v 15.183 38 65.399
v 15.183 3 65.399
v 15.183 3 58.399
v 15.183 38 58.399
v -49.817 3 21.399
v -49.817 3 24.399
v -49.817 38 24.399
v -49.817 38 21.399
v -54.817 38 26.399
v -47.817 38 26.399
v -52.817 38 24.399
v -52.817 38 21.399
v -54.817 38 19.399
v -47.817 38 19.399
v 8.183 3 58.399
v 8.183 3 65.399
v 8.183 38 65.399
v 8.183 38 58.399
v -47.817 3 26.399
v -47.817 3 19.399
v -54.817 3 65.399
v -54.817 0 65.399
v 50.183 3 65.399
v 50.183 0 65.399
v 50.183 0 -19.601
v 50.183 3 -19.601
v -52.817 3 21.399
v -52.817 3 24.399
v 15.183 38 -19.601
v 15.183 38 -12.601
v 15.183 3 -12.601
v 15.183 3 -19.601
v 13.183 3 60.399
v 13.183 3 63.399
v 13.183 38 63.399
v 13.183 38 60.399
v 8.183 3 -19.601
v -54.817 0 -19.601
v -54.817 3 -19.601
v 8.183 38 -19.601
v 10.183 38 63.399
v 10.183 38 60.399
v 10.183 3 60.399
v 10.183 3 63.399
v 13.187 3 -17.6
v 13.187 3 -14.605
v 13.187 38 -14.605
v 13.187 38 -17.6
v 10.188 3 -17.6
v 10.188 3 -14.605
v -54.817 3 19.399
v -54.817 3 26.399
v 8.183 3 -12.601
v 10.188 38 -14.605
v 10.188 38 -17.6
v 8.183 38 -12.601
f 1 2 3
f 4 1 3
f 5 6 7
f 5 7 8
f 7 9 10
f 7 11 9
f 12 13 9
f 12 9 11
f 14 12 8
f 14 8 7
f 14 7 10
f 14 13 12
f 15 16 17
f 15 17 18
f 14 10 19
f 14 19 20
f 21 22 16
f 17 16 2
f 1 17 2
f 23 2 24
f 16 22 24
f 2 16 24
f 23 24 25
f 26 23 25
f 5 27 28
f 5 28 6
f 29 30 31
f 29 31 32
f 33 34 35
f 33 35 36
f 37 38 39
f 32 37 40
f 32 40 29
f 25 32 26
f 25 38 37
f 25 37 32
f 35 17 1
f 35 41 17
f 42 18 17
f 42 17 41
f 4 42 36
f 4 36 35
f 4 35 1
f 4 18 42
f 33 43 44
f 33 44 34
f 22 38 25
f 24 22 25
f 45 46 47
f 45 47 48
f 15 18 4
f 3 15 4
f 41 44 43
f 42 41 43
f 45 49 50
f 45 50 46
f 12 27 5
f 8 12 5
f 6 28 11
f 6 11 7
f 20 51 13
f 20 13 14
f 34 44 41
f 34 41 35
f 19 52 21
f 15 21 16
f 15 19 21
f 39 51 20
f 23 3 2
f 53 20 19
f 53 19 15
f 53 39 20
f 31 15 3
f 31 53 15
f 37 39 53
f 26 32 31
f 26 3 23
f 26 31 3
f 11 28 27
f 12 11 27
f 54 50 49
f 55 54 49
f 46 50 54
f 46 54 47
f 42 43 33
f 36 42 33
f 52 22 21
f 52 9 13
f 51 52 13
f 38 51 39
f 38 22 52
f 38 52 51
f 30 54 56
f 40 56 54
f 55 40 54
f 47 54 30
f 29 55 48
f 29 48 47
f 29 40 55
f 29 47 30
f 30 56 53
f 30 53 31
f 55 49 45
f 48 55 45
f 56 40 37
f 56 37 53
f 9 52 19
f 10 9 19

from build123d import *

# Parameters (mm, degrees)
SKETCH3_W           = 105
SKETCH3_H           = 85
BOSS_EXTRUDE3_DEPTH = 3
SKETCH5_W           = 7
SKETCH5_H           = 7
SKETCH5_W_2         = 3
SKETCH5_H_2         = 3
BOSS_EXTRUDE4_DEPTH = 35
SKETCH9_W           = 2.998895248
SKETCH9_H           = 2.995380601
BOSS_EXTRUDE5_DEPTH = 35
SKETCH11_W          = 7
SKETCH11_H          = 7
SKETCH11_W_2        = 3
SKETCH11_H_2        = 3
BOSS_EXTRUDE6_DEPTH = 35


with BuildPart() as part:
    # Sketch3 → Boss-Extrude3 (new body)
    with BuildSketch(Plane(origin=(0, 0, 0), x_dir=(1, 0, 0), z_dir=(0, 1, 0))):
        with Locations((-2.316884661, -22.898810939)):
            Rectangle(SKETCH3_W, SKETCH3_H)
    extrude(amount=BOSS_EXTRUDE3_DEPTH)

    # Sketch5 → Boss-Extrude4 (add)
    with BuildSketch(Plane(origin=(0, 3, 0), x_dir=(1, 0, 0), z_dir=(0, 1, 0))):
        with Locations((11.683115339, -61.898810939)):
            Rectangle(SKETCH5_W, SKETCH5_H)
        with Locations((11.683115339, -61.898810939)):
            Rectangle(SKETCH5_W_2, SKETCH5_H_2, mode=Mode.SUBTRACT)
    extrude(amount=BOSS_EXTRUDE4_DEPTH)

    # Sketch9 → Boss-Extrude5 (add)
    with BuildSketch(Plane(origin=(0, 3, 0), x_dir=(1, 0, 0), z_dir=(0, 1, 0))):
        Polygon((15.183115339, 12.601189061), (15.183115339, 19.601189061), (8.183115339, 19.601189061), (8.183115339, 17.600348451), (8.183115339, 12.601189061), align=None)
        with Locations((11.687877227, 16.102658151)):
            Rectangle(SKETCH9_W, SKETCH9_H, mode=Mode.SUBTRACT)
    extrude(amount=BOSS_EXTRUDE5_DEPTH)

    # Sketch11 → Boss-Extrude6 (add)
    with BuildSketch(Plane(origin=(0, 3, 0), x_dir=(1, 0, 0), z_dir=(0, 1, 0))):
        with Locations((-51.316884661, -22.898810939)):
            Rectangle(SKETCH11_W, SKETCH11_H)
        with Locations((-51.316884661, -22.898810939)):
            Rectangle(SKETCH11_W_2, SKETCH11_H_2, mode=Mode.SUBTRACT)
    extrude(amount=BOSS_EXTRUDE6_DEPTH)


solid = part.part
